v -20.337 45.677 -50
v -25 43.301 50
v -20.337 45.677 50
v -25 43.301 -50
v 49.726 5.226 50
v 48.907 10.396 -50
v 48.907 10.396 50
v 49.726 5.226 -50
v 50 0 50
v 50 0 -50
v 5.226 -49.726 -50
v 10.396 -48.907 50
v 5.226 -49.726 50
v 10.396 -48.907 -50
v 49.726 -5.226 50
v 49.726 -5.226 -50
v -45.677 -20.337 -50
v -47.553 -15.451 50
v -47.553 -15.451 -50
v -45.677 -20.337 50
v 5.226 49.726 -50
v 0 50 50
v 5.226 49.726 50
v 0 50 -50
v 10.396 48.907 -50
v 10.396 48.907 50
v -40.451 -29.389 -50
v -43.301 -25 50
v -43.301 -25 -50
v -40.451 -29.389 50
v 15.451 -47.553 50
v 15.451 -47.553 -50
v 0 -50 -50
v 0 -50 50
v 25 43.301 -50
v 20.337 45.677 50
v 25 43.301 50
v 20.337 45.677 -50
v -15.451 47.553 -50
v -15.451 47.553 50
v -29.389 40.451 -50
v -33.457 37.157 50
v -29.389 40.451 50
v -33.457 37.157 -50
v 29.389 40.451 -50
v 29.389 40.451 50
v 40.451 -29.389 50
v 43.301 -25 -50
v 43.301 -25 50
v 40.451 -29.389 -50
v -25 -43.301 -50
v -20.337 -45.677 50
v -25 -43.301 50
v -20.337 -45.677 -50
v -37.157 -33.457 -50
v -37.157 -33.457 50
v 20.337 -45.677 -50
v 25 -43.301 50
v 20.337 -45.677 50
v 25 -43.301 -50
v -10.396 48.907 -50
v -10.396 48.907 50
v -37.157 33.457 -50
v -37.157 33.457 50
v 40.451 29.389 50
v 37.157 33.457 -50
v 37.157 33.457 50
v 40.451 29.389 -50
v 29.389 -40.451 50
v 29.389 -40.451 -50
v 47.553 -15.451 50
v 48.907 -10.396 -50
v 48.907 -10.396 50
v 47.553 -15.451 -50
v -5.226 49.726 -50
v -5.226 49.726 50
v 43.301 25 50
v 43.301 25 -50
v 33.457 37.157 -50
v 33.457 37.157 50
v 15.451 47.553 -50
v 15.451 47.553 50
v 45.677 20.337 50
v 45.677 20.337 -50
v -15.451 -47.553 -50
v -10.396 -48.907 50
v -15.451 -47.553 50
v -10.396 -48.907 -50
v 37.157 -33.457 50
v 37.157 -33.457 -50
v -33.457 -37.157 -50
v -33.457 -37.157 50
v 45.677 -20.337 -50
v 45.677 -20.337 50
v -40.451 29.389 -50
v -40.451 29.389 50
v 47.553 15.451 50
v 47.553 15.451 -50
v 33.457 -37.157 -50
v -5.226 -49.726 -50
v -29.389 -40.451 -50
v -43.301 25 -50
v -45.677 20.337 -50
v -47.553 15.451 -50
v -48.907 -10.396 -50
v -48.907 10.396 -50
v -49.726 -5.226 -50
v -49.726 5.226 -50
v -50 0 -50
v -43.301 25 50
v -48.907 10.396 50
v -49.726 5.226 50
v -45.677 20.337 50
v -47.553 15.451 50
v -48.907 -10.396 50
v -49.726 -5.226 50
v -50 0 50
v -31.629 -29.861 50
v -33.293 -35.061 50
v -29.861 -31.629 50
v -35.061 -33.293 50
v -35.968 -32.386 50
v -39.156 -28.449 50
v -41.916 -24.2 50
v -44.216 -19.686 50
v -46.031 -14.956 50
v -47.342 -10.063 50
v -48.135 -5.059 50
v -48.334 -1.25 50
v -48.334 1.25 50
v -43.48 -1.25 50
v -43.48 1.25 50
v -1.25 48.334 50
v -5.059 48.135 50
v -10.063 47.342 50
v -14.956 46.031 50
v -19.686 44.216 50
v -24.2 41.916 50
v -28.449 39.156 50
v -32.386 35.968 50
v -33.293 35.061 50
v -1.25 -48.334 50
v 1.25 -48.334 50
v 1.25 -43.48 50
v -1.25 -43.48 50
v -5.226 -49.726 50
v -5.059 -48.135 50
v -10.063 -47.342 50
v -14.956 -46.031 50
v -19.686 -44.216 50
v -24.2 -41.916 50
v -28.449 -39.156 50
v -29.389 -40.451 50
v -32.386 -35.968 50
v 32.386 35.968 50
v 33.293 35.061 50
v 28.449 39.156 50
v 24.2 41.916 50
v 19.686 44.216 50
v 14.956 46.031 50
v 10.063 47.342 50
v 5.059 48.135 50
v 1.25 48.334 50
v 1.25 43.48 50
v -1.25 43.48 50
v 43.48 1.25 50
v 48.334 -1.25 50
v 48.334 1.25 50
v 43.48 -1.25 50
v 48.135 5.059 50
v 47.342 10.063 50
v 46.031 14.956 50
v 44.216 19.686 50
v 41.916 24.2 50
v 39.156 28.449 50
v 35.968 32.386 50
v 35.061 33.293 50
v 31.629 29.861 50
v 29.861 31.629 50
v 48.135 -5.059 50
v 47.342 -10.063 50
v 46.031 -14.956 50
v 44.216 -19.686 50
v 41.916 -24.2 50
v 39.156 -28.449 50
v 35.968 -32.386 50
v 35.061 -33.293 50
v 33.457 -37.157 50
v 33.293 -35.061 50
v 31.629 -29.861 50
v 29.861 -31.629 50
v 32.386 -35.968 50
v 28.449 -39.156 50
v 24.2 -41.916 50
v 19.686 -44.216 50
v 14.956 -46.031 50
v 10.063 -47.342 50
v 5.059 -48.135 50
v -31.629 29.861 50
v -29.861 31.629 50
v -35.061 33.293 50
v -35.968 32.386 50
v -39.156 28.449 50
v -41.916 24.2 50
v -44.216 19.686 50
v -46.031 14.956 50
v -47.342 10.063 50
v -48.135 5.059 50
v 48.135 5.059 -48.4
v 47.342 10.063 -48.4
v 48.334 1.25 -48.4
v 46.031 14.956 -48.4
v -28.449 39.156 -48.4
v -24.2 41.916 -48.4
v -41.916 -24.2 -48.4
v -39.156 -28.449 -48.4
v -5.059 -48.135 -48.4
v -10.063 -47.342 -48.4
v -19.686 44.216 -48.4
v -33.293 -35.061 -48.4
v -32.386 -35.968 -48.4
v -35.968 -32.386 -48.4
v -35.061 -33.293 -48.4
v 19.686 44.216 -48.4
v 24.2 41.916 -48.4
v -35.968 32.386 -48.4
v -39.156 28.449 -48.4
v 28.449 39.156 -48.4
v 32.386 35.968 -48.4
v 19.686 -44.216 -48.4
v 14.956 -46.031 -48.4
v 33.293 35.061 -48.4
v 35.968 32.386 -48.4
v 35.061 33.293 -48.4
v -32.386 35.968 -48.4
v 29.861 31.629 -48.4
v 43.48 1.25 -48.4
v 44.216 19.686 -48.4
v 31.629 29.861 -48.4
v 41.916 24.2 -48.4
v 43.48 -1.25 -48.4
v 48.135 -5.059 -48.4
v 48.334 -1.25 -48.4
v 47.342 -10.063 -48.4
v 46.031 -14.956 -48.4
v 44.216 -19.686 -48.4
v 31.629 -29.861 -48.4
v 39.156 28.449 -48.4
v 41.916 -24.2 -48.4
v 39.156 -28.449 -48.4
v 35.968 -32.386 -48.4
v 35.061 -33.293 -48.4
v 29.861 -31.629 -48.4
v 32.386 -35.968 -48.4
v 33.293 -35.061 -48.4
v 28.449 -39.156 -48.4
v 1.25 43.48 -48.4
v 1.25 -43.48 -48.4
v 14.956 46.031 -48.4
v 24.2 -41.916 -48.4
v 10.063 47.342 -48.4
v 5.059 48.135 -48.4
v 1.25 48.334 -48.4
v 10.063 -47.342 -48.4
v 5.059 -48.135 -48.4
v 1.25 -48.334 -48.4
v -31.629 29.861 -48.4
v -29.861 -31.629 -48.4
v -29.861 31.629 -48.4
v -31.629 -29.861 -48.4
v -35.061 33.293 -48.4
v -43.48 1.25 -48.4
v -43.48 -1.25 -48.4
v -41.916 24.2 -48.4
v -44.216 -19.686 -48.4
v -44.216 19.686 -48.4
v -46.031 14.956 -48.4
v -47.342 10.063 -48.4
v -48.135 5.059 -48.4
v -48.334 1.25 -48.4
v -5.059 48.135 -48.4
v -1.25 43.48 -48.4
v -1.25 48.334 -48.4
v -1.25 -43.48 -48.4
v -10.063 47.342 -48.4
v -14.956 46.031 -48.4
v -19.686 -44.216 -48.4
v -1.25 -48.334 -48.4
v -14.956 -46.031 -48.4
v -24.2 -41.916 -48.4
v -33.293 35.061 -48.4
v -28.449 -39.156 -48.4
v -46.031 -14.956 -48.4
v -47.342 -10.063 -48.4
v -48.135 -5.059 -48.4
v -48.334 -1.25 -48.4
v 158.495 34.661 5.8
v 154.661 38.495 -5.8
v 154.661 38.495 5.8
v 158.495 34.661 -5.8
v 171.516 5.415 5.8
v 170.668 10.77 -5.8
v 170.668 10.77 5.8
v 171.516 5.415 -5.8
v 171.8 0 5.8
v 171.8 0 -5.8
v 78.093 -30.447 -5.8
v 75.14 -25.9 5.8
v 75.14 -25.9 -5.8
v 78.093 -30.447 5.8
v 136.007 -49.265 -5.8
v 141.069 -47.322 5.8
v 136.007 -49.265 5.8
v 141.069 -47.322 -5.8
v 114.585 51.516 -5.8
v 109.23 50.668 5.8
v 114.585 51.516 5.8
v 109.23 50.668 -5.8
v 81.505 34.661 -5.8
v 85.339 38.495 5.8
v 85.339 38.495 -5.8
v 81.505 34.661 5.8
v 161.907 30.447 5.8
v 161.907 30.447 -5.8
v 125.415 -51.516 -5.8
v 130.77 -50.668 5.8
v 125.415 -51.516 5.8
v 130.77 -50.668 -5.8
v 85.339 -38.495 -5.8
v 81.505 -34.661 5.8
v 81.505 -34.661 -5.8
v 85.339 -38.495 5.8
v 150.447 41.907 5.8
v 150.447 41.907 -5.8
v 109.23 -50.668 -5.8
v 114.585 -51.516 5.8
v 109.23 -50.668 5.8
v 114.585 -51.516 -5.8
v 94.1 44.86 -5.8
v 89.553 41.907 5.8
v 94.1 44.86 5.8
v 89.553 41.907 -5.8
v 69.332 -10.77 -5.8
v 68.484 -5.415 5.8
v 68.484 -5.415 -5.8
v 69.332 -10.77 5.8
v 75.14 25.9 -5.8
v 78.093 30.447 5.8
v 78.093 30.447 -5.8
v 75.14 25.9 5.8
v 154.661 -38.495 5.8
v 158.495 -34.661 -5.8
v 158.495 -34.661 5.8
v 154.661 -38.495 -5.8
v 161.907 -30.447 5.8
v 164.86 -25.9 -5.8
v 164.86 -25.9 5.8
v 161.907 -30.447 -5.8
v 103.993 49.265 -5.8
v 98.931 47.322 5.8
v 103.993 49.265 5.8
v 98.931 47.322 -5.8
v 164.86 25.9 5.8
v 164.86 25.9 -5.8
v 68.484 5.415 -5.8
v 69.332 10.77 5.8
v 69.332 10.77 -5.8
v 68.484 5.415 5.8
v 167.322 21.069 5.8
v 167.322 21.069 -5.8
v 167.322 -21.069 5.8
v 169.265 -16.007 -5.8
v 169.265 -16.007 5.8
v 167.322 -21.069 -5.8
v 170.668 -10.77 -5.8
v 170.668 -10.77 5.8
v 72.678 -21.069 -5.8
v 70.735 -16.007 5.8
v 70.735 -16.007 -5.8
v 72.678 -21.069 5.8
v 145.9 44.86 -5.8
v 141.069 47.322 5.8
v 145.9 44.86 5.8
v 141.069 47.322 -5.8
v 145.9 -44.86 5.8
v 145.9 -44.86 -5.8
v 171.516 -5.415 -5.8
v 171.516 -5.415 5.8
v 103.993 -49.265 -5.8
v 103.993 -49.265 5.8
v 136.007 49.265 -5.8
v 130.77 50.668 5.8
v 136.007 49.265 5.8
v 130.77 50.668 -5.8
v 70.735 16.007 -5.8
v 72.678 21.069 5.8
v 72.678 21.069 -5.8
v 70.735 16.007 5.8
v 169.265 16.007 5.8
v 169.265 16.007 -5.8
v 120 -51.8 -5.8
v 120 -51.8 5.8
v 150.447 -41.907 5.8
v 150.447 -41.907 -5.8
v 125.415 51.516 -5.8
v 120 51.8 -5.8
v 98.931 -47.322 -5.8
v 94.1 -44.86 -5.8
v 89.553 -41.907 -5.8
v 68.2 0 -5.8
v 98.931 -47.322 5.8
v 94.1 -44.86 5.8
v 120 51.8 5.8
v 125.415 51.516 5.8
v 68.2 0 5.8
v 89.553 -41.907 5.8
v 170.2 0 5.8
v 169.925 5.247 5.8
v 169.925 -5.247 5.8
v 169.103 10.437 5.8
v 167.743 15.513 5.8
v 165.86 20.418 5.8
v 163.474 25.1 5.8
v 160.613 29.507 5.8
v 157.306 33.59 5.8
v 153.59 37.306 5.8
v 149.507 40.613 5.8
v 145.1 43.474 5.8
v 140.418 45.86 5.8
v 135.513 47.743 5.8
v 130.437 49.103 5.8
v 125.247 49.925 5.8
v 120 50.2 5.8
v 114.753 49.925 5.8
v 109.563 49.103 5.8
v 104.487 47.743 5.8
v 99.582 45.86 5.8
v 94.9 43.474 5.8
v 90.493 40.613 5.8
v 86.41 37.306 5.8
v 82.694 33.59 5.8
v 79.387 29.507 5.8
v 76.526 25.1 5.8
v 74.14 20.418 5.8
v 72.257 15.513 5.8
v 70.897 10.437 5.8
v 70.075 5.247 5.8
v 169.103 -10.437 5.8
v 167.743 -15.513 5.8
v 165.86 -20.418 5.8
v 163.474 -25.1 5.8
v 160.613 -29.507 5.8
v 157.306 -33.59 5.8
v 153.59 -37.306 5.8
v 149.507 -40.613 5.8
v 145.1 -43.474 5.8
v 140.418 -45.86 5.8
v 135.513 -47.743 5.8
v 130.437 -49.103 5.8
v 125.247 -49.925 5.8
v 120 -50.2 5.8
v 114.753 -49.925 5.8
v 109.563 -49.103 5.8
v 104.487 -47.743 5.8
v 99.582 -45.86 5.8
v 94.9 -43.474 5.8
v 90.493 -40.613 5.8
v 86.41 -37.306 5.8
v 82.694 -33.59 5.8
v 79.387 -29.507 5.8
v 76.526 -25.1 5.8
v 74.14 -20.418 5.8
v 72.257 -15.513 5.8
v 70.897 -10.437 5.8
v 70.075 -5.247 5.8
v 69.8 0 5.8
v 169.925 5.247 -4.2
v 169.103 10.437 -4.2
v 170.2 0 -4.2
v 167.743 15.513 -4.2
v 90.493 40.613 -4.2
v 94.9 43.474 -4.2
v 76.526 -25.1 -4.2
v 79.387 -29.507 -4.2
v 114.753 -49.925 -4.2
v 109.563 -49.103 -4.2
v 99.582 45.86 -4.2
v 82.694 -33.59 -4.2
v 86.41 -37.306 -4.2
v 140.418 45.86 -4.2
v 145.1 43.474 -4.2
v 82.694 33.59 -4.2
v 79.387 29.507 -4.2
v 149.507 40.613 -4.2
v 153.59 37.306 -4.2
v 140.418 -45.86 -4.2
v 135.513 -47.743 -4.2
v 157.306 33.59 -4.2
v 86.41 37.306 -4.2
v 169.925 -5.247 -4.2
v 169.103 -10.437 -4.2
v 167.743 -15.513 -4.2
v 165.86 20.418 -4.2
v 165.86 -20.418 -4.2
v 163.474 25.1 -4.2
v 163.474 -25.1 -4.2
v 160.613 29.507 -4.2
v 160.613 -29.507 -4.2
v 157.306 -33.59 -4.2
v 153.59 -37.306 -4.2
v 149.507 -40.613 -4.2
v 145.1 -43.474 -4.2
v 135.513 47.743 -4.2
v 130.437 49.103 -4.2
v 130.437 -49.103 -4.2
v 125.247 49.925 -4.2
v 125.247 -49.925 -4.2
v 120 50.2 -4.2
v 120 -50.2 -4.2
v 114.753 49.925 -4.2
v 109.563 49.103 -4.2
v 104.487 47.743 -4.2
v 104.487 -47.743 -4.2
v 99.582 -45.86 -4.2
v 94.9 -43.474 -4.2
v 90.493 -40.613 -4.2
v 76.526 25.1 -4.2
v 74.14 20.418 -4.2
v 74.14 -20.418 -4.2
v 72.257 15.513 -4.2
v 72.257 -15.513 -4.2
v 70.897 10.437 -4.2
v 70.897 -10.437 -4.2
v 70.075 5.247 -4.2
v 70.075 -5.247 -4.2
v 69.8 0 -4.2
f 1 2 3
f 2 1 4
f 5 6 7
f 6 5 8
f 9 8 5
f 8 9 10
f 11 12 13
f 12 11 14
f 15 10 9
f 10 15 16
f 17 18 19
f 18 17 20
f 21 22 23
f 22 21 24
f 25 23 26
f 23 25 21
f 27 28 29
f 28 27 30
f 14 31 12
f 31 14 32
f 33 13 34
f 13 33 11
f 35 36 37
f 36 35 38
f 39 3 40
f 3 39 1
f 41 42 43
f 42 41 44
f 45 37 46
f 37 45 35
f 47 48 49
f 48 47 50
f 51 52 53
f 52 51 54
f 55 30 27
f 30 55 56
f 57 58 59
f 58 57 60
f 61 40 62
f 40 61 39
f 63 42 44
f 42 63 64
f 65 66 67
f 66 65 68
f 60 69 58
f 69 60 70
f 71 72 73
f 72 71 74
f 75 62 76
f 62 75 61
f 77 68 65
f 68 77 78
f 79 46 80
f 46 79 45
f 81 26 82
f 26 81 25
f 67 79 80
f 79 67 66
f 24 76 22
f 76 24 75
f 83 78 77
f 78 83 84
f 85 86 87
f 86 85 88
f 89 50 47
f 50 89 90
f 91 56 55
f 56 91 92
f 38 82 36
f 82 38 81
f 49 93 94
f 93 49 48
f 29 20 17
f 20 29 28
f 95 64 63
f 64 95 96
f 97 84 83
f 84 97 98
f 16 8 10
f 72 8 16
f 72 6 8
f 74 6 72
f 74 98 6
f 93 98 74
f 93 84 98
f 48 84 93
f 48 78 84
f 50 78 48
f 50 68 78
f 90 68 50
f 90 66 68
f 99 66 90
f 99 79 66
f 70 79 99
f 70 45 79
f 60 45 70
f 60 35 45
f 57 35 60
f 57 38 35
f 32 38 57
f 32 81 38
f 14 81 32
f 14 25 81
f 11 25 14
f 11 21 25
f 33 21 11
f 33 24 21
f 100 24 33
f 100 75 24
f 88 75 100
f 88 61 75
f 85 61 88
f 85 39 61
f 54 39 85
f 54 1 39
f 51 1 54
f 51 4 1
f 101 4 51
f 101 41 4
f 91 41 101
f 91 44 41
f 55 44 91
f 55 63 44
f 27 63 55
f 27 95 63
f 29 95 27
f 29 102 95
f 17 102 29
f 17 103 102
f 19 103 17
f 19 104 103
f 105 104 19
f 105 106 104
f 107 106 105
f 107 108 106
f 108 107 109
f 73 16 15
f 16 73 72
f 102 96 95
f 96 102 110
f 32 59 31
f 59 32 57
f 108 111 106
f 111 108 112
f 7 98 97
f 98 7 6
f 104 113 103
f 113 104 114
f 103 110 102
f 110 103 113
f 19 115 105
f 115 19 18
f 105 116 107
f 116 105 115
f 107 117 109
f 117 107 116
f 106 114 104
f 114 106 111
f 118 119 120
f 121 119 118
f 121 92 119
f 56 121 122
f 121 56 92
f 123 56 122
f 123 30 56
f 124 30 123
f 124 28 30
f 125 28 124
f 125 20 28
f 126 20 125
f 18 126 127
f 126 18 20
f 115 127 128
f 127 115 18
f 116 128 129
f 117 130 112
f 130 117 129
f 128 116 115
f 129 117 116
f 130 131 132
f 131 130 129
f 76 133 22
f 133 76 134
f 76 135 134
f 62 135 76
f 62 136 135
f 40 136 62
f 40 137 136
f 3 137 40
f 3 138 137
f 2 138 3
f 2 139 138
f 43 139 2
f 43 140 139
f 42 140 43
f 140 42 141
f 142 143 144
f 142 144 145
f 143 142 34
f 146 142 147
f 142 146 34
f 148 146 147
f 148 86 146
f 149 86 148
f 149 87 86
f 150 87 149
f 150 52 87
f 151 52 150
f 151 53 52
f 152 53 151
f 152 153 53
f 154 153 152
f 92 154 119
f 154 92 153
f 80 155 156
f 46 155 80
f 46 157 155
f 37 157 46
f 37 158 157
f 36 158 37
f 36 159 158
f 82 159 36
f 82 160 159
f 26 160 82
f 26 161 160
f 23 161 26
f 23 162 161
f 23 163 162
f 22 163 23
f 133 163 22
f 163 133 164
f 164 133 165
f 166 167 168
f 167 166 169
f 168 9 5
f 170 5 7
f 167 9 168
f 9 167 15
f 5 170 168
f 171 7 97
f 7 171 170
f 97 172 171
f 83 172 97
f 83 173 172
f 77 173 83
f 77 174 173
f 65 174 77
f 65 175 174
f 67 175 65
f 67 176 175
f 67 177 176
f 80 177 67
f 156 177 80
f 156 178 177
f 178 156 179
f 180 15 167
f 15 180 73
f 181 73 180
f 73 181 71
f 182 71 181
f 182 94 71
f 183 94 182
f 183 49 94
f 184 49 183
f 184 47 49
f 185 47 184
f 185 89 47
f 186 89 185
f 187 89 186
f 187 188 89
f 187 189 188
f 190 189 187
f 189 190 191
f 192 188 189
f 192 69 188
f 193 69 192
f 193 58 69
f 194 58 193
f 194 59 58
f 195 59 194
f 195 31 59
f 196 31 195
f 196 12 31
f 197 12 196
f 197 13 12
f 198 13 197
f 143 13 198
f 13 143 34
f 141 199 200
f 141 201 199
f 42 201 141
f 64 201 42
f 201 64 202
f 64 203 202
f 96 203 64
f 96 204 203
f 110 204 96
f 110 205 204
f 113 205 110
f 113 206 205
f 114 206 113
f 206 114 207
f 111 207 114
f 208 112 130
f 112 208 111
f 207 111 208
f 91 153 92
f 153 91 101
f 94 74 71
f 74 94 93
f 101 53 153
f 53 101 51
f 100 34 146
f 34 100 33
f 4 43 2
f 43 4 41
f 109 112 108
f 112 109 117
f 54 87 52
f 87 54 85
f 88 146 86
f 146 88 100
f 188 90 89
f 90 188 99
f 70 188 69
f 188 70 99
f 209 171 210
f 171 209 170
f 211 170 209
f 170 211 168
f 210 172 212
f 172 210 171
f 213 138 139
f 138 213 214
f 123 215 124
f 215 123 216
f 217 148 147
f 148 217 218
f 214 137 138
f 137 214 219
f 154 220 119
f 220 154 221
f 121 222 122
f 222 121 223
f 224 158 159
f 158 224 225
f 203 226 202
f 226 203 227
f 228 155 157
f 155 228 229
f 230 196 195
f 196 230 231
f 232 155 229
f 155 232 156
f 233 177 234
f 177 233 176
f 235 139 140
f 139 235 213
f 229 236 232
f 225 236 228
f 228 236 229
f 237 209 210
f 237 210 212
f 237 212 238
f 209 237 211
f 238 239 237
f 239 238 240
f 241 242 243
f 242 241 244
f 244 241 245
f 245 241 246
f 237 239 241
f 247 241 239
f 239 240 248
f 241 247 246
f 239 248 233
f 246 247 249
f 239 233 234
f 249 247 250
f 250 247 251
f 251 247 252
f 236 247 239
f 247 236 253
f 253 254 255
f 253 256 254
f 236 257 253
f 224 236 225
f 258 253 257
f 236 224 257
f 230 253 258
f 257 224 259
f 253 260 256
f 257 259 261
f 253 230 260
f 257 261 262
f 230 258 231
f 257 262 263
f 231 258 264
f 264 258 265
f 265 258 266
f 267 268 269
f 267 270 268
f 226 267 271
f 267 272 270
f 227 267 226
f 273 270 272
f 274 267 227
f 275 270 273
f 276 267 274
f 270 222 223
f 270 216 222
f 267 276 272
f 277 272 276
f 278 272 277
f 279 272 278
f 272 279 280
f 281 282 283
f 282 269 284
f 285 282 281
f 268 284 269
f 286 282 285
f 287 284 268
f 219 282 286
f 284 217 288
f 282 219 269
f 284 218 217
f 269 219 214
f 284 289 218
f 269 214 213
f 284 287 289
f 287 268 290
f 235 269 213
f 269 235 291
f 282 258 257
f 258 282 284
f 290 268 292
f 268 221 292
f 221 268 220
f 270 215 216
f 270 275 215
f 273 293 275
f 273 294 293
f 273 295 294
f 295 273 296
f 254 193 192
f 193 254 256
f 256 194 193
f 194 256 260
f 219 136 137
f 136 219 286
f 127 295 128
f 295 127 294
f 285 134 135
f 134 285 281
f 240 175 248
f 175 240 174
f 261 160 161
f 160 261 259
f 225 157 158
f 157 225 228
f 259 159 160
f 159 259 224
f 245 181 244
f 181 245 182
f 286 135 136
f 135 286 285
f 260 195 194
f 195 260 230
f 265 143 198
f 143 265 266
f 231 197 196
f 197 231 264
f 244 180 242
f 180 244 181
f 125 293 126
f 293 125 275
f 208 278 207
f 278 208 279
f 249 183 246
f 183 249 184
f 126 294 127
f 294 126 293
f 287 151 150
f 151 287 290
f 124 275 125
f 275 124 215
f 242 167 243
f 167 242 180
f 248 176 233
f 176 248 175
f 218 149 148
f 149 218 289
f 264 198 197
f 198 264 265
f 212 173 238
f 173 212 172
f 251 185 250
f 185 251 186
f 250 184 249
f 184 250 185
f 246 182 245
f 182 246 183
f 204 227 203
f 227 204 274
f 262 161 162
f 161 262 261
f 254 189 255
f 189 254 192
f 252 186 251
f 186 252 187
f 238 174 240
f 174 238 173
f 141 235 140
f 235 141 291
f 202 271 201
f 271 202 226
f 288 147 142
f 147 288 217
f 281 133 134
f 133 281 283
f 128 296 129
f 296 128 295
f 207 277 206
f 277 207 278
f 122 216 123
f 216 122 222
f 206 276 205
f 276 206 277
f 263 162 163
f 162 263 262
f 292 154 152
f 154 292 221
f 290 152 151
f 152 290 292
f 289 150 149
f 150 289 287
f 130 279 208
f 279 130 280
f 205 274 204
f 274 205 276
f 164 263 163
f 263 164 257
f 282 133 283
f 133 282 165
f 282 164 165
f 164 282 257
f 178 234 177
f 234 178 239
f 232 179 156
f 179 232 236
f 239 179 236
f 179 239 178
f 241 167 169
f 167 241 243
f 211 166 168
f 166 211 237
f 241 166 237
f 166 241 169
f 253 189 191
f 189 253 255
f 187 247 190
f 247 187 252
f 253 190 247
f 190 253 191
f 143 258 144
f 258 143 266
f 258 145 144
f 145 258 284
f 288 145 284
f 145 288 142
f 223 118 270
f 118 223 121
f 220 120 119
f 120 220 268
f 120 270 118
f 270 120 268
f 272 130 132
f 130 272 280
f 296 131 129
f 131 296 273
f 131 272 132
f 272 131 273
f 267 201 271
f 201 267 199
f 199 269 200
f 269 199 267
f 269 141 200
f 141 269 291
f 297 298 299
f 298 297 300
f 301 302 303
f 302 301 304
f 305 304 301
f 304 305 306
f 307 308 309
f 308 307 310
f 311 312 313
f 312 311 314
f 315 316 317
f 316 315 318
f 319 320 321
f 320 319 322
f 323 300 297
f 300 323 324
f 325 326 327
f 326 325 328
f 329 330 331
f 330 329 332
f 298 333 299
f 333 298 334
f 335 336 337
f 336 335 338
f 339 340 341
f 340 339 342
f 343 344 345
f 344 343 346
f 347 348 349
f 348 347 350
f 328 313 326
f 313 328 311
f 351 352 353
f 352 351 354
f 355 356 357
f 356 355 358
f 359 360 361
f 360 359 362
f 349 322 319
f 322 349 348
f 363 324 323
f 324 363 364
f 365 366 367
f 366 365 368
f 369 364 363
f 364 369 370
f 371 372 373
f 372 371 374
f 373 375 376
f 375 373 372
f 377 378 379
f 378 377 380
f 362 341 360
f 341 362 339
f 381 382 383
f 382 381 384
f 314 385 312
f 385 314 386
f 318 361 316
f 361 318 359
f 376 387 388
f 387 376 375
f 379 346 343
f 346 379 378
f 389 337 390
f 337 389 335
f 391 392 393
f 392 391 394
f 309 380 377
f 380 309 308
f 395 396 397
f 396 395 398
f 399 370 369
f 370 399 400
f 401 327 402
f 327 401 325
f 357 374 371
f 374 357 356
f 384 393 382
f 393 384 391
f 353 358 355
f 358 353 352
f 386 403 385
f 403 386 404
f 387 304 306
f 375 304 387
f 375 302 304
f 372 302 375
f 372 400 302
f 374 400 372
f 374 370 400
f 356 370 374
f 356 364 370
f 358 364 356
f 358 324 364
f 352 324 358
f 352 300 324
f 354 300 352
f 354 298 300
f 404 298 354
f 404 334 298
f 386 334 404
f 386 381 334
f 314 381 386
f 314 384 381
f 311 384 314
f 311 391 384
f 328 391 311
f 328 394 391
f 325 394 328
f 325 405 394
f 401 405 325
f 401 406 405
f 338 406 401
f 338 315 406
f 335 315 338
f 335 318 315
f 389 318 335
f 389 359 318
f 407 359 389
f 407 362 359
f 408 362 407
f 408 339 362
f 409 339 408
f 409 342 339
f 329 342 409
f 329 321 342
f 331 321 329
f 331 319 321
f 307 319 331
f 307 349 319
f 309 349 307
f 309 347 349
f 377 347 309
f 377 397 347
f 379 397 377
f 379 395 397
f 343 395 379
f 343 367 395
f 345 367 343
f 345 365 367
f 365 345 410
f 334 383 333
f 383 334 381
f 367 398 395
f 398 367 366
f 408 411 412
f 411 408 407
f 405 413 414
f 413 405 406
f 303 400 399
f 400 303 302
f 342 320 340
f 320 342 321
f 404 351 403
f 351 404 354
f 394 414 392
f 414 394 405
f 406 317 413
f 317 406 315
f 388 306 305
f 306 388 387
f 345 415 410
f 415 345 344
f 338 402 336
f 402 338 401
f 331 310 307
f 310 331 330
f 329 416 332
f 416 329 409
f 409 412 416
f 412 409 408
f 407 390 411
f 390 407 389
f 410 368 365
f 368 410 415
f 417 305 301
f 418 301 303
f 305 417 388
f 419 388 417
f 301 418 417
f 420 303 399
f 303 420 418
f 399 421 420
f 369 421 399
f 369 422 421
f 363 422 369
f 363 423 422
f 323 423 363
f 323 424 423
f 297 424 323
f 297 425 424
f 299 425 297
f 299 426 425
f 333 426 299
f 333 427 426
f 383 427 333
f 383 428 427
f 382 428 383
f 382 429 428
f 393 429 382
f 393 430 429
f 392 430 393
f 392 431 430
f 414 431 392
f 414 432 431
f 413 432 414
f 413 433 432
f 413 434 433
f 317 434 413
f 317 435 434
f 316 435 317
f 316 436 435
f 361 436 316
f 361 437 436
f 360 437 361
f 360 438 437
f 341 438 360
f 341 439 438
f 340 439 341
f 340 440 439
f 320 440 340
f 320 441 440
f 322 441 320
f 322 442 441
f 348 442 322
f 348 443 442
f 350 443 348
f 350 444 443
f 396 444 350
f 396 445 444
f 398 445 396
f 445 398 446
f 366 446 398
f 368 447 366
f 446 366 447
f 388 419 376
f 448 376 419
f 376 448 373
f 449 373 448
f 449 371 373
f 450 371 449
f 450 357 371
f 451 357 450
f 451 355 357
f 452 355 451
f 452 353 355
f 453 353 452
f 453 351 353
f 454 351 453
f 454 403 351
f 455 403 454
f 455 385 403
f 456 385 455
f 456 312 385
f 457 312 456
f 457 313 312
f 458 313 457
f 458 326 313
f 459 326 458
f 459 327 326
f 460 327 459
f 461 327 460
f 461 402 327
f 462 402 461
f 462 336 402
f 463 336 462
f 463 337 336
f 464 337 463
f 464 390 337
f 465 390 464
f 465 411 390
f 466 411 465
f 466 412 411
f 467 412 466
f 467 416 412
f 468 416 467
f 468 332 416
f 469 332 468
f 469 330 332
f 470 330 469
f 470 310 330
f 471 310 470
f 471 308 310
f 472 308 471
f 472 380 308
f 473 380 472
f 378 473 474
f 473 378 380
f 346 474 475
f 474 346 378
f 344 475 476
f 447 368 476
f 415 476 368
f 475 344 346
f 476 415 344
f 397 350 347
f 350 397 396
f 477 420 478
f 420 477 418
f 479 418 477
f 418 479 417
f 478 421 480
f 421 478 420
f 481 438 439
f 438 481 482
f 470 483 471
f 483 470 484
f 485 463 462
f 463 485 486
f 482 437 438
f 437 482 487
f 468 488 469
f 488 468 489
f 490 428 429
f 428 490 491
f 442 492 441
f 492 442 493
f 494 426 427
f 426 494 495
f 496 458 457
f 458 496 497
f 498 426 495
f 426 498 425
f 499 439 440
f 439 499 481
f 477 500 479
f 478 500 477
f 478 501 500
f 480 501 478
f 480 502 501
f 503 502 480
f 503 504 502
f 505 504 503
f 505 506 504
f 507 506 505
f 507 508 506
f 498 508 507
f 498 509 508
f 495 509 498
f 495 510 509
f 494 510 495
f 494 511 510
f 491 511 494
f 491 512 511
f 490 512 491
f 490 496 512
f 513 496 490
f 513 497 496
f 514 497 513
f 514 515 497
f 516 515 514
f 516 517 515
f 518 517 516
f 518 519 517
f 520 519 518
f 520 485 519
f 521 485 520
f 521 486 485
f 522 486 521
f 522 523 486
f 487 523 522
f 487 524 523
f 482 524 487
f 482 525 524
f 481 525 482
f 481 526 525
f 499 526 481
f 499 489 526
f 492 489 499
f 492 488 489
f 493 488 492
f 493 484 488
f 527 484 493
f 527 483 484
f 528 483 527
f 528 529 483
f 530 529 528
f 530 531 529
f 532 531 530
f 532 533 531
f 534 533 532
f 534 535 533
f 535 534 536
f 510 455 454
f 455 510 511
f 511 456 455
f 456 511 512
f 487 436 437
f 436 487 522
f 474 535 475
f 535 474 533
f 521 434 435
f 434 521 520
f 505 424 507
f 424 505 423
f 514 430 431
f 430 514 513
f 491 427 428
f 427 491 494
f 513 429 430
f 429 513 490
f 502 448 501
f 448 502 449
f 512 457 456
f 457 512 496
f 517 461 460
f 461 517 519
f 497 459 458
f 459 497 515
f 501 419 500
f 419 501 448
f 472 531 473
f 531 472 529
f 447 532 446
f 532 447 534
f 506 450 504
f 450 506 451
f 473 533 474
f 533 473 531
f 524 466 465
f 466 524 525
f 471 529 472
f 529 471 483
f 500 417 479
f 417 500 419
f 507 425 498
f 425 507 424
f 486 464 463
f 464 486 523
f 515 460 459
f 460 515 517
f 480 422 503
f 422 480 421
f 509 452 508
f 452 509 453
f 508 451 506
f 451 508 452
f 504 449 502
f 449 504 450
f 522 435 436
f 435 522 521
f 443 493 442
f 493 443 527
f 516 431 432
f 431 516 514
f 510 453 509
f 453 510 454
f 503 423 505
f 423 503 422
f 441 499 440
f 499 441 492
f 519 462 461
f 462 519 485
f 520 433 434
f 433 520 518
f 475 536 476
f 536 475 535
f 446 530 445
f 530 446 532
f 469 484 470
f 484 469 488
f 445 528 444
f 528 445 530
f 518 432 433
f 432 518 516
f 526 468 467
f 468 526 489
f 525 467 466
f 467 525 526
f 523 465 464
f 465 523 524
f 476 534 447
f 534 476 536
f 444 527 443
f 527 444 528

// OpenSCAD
DrumSize = [100,50];
WallThick = 1.6;
finCnt = 8;
lidTol = 0.2;
$fn=60;

//Body of drum
module Drum(){
    difference(){
        cylinder(h=DrumSize[0],r=DrumSize[1],center=true);
        translate([0,0,WallThick])cylinder(h=DrumSize[0],r=DrumSize[1]-(WallThick),center=true);
}}

module fin(){
    union(){
        for (i = [0:finCnt-1]) {
            translate([sin(360*i/finCnt)*(DrumSize[1]-WallThick)*.95, cos(360*i/finCnt)*(DrumSize[1]-WallThick)*.95, 0 ])
            rotate([0,0,-(360/finCnt)*i])cube([DrumSize[1]*.05,DrumSize[1]*.1,DrumSize[0]],center=true);
}}}

module lid(){
    difference(){
        cylinder(h=(DrumSize[0]*.1)+WallThick,r=DrumSize[1]+(WallThick+lidTol),center=true);
        translate([0,0,WallThick])cylinder(h=(DrumSize[0]*.1)+WallThick,r=DrumSize[1]+lidTol,center=true);
}}
module CompDrum(){
    union(){
        Drum();
        fin();
    }
}
render(convexity=20){
    CompDrum();
    translate([DrumSize[0]+20,0,0])lid();
}
